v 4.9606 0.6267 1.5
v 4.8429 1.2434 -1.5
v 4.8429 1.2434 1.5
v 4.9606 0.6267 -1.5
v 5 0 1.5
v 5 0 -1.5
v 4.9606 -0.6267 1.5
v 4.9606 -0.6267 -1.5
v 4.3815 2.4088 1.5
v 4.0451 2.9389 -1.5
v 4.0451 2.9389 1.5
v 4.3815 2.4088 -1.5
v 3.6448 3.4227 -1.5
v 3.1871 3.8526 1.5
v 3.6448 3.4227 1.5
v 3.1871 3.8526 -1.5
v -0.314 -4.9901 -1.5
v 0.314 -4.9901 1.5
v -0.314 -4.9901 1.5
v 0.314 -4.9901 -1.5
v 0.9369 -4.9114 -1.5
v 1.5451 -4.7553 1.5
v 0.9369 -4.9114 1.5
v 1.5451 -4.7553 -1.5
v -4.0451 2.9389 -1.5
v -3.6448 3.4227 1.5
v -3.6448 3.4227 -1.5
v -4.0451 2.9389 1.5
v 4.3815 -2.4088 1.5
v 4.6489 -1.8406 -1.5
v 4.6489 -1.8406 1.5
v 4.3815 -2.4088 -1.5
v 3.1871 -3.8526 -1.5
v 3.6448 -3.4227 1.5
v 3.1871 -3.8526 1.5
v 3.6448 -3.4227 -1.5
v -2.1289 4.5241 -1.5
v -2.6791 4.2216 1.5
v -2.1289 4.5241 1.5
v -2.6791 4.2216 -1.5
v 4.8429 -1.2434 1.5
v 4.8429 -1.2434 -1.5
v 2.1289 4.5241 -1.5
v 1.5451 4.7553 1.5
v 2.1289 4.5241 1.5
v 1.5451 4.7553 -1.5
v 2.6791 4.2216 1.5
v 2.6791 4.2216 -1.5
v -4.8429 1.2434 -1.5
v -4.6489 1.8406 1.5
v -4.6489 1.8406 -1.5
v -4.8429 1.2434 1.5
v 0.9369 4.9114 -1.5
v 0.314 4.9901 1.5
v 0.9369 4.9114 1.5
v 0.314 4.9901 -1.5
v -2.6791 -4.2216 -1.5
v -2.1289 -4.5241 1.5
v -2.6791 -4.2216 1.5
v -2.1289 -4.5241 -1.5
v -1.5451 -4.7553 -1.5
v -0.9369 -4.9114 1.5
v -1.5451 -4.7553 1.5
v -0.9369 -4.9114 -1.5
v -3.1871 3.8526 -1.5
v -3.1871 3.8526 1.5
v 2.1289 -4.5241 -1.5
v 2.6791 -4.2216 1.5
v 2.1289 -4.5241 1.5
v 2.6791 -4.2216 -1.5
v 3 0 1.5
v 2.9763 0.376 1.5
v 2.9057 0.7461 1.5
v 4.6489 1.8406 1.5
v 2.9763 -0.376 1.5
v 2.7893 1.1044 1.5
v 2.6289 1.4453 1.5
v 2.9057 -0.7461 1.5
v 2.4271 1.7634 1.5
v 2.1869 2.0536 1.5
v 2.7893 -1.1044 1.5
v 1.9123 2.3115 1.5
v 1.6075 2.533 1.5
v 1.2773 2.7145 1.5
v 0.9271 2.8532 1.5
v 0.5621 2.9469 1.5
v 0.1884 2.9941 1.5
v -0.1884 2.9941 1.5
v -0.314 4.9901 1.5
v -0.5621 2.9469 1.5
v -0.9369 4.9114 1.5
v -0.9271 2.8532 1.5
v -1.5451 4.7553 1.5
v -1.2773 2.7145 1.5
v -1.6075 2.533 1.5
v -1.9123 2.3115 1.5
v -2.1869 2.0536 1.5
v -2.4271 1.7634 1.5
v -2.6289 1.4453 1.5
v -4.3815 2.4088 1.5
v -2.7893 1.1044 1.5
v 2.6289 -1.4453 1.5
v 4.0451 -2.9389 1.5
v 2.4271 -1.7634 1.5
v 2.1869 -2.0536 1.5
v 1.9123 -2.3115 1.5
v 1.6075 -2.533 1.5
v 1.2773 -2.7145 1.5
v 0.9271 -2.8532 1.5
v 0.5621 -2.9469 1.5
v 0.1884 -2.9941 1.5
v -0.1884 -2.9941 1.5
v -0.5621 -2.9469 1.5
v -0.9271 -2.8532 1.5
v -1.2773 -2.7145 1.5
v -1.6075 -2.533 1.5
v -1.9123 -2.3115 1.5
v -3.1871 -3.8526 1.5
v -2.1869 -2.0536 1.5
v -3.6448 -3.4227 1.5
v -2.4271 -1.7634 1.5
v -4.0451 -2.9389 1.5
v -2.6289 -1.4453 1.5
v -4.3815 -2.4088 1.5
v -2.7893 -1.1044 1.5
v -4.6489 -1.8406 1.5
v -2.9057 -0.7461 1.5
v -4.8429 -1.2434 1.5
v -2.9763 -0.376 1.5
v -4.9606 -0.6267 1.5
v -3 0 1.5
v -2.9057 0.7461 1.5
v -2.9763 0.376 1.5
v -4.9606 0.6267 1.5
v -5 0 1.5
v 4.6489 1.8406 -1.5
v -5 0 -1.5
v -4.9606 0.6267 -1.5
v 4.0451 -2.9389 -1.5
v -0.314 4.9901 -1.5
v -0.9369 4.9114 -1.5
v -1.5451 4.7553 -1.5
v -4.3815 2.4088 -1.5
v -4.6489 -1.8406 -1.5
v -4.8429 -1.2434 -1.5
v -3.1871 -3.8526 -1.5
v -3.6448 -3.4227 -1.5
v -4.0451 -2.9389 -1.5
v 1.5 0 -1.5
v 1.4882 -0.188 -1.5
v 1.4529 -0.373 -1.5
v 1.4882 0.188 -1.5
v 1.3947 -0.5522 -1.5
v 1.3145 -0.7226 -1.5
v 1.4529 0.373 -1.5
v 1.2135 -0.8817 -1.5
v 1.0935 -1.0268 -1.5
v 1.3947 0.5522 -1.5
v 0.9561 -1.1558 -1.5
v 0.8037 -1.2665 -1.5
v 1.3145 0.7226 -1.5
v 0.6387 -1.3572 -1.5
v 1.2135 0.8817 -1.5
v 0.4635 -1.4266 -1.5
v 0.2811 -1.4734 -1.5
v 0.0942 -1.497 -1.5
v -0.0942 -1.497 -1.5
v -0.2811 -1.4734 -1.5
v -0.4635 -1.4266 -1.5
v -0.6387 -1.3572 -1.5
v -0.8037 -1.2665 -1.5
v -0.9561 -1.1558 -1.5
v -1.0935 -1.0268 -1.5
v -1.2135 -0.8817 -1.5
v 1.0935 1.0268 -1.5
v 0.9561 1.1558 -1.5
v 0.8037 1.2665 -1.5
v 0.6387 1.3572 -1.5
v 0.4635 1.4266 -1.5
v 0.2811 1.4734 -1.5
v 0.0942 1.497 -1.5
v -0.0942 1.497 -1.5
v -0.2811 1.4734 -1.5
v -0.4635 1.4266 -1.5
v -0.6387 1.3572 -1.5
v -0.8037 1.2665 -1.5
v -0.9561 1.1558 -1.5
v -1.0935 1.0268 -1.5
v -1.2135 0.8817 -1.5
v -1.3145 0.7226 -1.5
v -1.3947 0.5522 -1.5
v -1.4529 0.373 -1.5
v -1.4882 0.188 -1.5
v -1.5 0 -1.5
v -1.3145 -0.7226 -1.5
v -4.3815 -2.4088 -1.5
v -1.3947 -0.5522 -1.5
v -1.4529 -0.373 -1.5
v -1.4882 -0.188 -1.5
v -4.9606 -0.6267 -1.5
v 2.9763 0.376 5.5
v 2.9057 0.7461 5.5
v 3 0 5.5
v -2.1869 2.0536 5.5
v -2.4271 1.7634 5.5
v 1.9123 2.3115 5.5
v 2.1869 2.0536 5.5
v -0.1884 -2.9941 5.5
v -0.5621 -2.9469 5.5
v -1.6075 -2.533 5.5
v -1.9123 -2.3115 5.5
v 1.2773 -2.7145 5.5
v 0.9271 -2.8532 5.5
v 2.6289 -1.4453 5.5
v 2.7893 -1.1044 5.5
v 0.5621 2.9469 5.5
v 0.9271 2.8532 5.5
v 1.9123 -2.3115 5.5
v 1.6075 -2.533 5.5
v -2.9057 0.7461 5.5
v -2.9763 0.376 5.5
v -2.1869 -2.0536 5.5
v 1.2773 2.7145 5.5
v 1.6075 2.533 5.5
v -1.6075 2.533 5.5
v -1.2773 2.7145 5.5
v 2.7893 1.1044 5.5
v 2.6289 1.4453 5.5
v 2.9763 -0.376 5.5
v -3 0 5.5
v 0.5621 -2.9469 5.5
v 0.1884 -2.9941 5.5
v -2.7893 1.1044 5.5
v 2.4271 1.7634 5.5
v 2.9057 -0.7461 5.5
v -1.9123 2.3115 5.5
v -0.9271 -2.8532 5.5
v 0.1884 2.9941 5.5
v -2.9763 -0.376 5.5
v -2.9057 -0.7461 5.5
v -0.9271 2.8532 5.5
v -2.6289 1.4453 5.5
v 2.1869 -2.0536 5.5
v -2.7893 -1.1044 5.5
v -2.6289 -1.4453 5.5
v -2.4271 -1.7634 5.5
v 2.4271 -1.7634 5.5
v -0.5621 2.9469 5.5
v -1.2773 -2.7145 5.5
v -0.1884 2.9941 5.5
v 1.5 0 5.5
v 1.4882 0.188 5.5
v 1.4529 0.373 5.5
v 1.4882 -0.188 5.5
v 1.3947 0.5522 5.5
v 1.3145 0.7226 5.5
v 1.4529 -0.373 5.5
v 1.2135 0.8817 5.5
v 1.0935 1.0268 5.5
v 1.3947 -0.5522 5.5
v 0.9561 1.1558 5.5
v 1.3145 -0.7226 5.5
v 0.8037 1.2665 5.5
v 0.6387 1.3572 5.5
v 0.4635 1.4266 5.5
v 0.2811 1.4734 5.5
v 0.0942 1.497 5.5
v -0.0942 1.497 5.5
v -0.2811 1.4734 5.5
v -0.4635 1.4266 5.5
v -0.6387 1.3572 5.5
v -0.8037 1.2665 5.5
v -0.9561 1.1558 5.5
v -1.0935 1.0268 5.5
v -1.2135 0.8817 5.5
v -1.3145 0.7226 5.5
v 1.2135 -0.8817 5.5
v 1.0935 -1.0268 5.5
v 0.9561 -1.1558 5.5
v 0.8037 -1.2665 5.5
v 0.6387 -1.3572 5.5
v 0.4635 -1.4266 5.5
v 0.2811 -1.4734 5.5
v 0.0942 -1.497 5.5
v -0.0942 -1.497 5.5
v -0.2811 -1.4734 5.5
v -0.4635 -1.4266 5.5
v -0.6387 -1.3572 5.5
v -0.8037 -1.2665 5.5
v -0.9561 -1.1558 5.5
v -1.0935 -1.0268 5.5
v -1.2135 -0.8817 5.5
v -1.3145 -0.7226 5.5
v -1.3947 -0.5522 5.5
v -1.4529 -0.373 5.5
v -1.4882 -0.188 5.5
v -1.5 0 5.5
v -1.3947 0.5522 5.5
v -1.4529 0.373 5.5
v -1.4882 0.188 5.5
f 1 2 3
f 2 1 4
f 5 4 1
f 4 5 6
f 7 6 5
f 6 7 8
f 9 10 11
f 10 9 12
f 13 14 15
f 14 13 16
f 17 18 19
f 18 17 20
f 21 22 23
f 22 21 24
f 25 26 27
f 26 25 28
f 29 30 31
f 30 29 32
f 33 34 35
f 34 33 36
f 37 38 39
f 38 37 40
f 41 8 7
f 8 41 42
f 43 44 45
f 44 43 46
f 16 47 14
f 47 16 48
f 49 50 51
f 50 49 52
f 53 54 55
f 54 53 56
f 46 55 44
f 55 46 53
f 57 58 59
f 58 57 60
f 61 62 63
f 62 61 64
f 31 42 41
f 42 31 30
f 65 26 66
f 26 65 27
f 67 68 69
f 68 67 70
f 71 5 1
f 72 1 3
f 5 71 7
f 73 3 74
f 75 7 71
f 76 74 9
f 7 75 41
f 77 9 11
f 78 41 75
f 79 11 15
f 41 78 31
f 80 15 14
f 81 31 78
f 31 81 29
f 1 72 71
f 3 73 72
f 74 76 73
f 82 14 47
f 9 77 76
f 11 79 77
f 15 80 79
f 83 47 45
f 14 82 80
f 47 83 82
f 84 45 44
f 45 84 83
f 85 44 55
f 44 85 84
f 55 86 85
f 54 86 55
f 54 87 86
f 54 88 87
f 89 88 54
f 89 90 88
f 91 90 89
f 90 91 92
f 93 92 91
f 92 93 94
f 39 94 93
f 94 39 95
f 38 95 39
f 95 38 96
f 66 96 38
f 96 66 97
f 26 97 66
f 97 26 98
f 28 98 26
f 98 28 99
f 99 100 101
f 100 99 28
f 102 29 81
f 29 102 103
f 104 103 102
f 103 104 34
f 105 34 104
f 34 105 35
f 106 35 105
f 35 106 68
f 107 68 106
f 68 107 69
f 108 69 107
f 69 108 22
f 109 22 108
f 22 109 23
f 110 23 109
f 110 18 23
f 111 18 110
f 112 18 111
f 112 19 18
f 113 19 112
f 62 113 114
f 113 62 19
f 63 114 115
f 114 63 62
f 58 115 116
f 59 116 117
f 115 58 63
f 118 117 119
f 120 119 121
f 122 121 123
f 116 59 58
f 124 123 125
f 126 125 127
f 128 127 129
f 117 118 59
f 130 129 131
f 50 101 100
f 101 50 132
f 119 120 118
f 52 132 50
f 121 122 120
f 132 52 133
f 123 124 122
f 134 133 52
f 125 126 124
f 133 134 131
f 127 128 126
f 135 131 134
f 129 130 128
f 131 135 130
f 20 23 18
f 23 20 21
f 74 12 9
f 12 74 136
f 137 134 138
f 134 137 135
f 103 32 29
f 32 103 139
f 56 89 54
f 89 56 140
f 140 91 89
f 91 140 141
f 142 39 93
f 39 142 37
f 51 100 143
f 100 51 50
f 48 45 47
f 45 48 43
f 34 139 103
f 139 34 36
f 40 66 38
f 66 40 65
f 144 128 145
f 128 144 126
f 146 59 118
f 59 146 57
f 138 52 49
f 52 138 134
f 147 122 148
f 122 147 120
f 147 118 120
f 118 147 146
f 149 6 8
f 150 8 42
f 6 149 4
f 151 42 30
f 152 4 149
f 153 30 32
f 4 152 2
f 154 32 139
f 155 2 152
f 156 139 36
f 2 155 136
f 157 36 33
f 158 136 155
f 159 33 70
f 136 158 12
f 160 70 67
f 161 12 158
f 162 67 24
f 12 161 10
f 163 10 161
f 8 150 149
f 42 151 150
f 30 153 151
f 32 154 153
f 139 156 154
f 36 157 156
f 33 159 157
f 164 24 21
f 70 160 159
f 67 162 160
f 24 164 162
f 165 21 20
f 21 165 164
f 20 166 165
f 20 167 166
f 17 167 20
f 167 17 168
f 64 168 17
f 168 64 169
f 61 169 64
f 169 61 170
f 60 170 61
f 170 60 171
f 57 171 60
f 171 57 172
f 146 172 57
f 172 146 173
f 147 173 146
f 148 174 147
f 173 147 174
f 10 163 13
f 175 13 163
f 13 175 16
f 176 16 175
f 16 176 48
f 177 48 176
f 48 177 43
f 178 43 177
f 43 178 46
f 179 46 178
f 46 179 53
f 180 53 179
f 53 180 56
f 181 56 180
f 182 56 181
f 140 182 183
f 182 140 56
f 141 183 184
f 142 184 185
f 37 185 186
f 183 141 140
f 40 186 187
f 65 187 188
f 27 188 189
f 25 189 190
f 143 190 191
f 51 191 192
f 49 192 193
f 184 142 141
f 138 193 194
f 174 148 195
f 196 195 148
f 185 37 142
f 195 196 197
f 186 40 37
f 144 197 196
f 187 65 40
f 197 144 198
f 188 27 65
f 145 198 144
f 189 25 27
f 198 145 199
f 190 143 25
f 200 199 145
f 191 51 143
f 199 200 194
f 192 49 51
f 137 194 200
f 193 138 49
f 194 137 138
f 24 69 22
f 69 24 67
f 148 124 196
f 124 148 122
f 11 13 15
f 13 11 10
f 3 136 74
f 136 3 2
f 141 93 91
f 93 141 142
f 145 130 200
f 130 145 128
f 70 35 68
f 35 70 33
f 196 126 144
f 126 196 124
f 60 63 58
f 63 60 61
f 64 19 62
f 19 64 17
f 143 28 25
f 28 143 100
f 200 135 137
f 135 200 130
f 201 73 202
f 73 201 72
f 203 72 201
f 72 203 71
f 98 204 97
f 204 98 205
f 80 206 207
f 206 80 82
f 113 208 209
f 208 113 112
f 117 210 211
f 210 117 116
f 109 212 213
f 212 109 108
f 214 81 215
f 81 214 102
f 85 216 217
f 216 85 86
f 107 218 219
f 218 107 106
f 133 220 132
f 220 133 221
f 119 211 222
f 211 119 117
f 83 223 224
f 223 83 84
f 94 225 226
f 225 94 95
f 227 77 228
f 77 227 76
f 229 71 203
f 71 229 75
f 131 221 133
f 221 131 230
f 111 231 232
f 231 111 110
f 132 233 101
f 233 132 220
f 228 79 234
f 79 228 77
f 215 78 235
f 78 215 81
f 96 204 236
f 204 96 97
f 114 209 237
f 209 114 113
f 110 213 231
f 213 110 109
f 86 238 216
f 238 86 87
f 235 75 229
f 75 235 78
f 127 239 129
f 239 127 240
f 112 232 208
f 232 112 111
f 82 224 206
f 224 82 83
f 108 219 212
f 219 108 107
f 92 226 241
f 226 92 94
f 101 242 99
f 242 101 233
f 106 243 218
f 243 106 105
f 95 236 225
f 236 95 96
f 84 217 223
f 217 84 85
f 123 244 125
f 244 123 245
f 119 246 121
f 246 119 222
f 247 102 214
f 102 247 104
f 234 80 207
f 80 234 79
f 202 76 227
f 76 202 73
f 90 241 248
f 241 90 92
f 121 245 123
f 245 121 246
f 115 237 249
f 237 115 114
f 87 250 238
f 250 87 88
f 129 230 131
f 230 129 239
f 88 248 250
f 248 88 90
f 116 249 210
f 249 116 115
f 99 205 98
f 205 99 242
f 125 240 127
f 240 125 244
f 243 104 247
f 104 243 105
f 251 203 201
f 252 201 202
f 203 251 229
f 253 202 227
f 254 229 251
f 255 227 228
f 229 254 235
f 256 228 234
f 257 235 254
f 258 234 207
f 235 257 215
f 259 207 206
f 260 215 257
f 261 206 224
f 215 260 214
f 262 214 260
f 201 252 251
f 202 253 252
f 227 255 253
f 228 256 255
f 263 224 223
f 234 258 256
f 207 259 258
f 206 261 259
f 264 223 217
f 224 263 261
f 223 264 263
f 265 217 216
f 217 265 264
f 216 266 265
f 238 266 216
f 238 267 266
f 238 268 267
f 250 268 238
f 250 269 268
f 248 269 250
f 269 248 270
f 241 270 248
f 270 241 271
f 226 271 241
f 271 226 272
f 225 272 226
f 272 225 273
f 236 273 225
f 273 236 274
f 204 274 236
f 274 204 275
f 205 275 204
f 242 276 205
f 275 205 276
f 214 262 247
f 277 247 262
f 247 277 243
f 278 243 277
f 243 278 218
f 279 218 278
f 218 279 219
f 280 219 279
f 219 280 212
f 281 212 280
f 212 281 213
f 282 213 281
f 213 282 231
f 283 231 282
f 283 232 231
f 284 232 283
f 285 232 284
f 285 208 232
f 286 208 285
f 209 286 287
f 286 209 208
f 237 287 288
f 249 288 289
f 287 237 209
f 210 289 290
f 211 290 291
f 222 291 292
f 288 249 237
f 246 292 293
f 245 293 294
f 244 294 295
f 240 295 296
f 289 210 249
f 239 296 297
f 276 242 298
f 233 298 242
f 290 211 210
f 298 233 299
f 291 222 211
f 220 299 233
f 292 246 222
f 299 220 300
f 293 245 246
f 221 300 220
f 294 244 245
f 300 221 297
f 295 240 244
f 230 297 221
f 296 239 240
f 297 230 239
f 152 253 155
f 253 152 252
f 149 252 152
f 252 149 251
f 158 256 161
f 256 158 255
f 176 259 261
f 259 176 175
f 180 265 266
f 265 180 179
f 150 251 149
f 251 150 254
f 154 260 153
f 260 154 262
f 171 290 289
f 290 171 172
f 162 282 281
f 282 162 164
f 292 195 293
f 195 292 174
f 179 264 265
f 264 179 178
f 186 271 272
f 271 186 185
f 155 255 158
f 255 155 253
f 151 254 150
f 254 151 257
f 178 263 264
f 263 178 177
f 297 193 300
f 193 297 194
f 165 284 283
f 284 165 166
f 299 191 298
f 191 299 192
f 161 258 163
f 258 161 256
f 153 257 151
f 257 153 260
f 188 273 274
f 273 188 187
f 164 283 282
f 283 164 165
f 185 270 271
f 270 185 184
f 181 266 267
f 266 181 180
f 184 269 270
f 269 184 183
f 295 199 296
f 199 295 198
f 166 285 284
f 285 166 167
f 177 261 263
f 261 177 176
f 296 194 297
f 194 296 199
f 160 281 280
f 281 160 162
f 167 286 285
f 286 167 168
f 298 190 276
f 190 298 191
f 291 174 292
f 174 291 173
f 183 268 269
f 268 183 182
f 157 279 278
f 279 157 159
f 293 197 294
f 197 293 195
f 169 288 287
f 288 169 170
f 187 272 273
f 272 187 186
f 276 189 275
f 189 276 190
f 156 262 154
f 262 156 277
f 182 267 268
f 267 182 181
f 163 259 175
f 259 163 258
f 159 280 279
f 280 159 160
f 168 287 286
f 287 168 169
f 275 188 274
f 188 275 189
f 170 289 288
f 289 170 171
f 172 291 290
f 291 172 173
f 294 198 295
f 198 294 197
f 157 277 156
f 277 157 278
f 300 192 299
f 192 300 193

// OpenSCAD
$fn = 50;


difference() {
	union() {
		translate(v = [0, 0, -1.5000000000]) {
			cylinder(h = 3, r = 5.0000000000);
		}
		translate(v = [0, 0, -1.5000000000]) {
			cylinder(h = 7, r = 3.0000000000);
		}
	}
	union() {
		translate(v = [0, 0, -100.0000000000]) {
			cylinder(h = 200, r = 1.5000000000);
		}
	}
}
